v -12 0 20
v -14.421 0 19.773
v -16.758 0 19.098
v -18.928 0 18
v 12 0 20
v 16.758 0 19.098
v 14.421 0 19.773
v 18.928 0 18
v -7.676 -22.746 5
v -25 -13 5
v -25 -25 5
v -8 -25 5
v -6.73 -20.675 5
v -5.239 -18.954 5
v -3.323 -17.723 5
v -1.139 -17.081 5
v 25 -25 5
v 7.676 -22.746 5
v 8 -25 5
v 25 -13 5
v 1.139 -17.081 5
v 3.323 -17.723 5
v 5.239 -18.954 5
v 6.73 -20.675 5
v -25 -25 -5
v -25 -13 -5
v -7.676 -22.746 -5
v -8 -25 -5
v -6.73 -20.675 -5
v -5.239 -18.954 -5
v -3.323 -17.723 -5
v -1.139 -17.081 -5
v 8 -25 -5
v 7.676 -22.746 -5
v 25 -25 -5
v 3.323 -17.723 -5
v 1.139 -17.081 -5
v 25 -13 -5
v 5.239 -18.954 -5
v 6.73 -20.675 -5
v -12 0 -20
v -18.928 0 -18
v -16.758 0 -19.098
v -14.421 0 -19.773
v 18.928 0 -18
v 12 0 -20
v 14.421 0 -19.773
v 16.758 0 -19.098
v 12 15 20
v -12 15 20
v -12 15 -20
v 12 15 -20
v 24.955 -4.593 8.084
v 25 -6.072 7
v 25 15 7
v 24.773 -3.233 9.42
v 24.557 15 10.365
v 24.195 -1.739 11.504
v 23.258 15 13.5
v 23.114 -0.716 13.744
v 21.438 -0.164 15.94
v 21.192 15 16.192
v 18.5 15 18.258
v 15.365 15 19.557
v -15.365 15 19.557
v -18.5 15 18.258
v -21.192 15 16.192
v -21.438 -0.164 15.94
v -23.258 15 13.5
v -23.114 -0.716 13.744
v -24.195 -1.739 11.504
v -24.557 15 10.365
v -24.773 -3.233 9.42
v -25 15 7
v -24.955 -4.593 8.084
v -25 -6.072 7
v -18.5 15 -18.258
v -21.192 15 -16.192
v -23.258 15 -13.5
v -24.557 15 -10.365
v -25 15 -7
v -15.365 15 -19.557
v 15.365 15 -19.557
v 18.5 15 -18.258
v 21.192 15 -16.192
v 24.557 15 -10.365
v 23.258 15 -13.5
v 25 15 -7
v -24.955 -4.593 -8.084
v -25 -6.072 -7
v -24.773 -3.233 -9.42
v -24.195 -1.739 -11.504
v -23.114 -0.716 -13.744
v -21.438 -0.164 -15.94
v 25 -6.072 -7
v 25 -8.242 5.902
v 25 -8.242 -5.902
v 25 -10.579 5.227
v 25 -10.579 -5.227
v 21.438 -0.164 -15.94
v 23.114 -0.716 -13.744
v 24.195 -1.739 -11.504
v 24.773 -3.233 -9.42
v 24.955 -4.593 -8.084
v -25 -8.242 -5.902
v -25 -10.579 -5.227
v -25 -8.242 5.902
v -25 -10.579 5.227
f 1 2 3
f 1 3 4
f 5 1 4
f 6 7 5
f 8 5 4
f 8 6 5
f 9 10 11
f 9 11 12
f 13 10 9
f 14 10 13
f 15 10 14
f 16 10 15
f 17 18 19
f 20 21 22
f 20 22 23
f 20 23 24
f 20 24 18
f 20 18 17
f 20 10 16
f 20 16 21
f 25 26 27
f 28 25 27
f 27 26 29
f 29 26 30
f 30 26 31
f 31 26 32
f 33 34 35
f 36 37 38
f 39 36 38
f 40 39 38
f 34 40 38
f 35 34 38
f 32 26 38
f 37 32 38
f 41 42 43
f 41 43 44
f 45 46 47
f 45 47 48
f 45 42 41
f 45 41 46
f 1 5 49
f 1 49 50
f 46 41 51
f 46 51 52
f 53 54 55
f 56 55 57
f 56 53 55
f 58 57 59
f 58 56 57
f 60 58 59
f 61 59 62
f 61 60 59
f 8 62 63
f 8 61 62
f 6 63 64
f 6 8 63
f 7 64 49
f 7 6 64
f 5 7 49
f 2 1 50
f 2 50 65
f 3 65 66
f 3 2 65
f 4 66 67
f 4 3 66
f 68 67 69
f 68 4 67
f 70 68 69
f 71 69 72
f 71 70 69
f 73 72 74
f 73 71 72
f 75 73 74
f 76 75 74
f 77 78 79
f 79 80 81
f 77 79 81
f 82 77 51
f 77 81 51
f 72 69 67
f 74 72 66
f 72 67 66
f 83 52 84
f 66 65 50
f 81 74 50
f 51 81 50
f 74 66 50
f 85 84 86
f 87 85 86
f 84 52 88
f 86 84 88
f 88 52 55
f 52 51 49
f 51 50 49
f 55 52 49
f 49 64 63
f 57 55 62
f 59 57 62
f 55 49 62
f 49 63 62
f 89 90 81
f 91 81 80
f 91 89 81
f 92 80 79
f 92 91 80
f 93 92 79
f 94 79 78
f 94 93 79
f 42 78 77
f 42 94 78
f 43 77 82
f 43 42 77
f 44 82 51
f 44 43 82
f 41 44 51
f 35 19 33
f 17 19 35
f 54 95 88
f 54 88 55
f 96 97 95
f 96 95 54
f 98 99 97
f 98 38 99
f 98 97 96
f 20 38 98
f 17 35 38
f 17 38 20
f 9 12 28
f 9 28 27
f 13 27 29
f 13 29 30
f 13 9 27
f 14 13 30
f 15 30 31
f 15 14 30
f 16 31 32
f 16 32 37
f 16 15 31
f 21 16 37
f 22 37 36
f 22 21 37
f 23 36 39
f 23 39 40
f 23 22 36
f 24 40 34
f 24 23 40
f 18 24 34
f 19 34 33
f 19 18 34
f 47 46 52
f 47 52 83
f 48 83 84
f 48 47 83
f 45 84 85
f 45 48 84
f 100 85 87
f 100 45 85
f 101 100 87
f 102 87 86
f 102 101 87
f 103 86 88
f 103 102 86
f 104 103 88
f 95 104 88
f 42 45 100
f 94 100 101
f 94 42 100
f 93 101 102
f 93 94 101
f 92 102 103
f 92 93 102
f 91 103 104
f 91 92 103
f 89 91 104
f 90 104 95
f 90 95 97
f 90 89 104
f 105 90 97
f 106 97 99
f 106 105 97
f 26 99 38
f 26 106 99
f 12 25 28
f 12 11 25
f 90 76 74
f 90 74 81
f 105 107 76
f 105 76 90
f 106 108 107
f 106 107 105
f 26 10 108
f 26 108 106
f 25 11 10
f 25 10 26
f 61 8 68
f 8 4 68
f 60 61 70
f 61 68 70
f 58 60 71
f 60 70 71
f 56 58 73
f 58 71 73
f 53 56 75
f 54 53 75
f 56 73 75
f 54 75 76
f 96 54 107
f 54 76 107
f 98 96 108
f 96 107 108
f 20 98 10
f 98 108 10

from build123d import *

# Parameters (mm, degrees)
F1_DEPTH = 15
F3_DEPTH = 5
F4_R     = 13


with BuildPart() as f1:
    # F0 (on Front) → F1 (new body)
    with BuildSketch(Plane.XZ):
        with BuildLine():
            ThreePointArc((25, 7), (21.192388, 16.192388), (12, 20))
            Line((12, 20), (-12, 20))
            ThreePointArc((-12, 20), (-21.192388, 16.192388), (-25, 7))
            Line((-25, 7), (-25, -7))
            ThreePointArc((-25, -7), (-21.192388, -16.192388), (-12, -20))
            Line((-12, -20), (12, -20))
            ThreePointArc((12, -20), (21.192388, -16.192388), (25, -7))
            Line((25, -7), (25, 7))
        make_face()
    extrude(amount=-F1_DEPTH)

    # F2 (on Top) → F3 (join, symmetric)
    with BuildSketch(Plane.XY):
        with BuildLine():
            Line((-25, -25), (-8, -25))
            ThreePointArc((-8, -25), (0, -17), (8, -25))
            Line((8, -25), (25, -25))
            Line((25, -25), (25, 0))
            Line((25, 0), (-25, 0))
            Line((-25, 0), (-25, -25))
        make_face()
    extrude(amount=F3_DEPTH, both=True)

    # F4
    f4_edges = [f1.edges().sort_by_distance(p)[0] for p in [
        (0, 0, 5),
        (0, 0, -5),
    ]]
    fillet(f4_edges, radius=F4_R)


solid = f1.part
